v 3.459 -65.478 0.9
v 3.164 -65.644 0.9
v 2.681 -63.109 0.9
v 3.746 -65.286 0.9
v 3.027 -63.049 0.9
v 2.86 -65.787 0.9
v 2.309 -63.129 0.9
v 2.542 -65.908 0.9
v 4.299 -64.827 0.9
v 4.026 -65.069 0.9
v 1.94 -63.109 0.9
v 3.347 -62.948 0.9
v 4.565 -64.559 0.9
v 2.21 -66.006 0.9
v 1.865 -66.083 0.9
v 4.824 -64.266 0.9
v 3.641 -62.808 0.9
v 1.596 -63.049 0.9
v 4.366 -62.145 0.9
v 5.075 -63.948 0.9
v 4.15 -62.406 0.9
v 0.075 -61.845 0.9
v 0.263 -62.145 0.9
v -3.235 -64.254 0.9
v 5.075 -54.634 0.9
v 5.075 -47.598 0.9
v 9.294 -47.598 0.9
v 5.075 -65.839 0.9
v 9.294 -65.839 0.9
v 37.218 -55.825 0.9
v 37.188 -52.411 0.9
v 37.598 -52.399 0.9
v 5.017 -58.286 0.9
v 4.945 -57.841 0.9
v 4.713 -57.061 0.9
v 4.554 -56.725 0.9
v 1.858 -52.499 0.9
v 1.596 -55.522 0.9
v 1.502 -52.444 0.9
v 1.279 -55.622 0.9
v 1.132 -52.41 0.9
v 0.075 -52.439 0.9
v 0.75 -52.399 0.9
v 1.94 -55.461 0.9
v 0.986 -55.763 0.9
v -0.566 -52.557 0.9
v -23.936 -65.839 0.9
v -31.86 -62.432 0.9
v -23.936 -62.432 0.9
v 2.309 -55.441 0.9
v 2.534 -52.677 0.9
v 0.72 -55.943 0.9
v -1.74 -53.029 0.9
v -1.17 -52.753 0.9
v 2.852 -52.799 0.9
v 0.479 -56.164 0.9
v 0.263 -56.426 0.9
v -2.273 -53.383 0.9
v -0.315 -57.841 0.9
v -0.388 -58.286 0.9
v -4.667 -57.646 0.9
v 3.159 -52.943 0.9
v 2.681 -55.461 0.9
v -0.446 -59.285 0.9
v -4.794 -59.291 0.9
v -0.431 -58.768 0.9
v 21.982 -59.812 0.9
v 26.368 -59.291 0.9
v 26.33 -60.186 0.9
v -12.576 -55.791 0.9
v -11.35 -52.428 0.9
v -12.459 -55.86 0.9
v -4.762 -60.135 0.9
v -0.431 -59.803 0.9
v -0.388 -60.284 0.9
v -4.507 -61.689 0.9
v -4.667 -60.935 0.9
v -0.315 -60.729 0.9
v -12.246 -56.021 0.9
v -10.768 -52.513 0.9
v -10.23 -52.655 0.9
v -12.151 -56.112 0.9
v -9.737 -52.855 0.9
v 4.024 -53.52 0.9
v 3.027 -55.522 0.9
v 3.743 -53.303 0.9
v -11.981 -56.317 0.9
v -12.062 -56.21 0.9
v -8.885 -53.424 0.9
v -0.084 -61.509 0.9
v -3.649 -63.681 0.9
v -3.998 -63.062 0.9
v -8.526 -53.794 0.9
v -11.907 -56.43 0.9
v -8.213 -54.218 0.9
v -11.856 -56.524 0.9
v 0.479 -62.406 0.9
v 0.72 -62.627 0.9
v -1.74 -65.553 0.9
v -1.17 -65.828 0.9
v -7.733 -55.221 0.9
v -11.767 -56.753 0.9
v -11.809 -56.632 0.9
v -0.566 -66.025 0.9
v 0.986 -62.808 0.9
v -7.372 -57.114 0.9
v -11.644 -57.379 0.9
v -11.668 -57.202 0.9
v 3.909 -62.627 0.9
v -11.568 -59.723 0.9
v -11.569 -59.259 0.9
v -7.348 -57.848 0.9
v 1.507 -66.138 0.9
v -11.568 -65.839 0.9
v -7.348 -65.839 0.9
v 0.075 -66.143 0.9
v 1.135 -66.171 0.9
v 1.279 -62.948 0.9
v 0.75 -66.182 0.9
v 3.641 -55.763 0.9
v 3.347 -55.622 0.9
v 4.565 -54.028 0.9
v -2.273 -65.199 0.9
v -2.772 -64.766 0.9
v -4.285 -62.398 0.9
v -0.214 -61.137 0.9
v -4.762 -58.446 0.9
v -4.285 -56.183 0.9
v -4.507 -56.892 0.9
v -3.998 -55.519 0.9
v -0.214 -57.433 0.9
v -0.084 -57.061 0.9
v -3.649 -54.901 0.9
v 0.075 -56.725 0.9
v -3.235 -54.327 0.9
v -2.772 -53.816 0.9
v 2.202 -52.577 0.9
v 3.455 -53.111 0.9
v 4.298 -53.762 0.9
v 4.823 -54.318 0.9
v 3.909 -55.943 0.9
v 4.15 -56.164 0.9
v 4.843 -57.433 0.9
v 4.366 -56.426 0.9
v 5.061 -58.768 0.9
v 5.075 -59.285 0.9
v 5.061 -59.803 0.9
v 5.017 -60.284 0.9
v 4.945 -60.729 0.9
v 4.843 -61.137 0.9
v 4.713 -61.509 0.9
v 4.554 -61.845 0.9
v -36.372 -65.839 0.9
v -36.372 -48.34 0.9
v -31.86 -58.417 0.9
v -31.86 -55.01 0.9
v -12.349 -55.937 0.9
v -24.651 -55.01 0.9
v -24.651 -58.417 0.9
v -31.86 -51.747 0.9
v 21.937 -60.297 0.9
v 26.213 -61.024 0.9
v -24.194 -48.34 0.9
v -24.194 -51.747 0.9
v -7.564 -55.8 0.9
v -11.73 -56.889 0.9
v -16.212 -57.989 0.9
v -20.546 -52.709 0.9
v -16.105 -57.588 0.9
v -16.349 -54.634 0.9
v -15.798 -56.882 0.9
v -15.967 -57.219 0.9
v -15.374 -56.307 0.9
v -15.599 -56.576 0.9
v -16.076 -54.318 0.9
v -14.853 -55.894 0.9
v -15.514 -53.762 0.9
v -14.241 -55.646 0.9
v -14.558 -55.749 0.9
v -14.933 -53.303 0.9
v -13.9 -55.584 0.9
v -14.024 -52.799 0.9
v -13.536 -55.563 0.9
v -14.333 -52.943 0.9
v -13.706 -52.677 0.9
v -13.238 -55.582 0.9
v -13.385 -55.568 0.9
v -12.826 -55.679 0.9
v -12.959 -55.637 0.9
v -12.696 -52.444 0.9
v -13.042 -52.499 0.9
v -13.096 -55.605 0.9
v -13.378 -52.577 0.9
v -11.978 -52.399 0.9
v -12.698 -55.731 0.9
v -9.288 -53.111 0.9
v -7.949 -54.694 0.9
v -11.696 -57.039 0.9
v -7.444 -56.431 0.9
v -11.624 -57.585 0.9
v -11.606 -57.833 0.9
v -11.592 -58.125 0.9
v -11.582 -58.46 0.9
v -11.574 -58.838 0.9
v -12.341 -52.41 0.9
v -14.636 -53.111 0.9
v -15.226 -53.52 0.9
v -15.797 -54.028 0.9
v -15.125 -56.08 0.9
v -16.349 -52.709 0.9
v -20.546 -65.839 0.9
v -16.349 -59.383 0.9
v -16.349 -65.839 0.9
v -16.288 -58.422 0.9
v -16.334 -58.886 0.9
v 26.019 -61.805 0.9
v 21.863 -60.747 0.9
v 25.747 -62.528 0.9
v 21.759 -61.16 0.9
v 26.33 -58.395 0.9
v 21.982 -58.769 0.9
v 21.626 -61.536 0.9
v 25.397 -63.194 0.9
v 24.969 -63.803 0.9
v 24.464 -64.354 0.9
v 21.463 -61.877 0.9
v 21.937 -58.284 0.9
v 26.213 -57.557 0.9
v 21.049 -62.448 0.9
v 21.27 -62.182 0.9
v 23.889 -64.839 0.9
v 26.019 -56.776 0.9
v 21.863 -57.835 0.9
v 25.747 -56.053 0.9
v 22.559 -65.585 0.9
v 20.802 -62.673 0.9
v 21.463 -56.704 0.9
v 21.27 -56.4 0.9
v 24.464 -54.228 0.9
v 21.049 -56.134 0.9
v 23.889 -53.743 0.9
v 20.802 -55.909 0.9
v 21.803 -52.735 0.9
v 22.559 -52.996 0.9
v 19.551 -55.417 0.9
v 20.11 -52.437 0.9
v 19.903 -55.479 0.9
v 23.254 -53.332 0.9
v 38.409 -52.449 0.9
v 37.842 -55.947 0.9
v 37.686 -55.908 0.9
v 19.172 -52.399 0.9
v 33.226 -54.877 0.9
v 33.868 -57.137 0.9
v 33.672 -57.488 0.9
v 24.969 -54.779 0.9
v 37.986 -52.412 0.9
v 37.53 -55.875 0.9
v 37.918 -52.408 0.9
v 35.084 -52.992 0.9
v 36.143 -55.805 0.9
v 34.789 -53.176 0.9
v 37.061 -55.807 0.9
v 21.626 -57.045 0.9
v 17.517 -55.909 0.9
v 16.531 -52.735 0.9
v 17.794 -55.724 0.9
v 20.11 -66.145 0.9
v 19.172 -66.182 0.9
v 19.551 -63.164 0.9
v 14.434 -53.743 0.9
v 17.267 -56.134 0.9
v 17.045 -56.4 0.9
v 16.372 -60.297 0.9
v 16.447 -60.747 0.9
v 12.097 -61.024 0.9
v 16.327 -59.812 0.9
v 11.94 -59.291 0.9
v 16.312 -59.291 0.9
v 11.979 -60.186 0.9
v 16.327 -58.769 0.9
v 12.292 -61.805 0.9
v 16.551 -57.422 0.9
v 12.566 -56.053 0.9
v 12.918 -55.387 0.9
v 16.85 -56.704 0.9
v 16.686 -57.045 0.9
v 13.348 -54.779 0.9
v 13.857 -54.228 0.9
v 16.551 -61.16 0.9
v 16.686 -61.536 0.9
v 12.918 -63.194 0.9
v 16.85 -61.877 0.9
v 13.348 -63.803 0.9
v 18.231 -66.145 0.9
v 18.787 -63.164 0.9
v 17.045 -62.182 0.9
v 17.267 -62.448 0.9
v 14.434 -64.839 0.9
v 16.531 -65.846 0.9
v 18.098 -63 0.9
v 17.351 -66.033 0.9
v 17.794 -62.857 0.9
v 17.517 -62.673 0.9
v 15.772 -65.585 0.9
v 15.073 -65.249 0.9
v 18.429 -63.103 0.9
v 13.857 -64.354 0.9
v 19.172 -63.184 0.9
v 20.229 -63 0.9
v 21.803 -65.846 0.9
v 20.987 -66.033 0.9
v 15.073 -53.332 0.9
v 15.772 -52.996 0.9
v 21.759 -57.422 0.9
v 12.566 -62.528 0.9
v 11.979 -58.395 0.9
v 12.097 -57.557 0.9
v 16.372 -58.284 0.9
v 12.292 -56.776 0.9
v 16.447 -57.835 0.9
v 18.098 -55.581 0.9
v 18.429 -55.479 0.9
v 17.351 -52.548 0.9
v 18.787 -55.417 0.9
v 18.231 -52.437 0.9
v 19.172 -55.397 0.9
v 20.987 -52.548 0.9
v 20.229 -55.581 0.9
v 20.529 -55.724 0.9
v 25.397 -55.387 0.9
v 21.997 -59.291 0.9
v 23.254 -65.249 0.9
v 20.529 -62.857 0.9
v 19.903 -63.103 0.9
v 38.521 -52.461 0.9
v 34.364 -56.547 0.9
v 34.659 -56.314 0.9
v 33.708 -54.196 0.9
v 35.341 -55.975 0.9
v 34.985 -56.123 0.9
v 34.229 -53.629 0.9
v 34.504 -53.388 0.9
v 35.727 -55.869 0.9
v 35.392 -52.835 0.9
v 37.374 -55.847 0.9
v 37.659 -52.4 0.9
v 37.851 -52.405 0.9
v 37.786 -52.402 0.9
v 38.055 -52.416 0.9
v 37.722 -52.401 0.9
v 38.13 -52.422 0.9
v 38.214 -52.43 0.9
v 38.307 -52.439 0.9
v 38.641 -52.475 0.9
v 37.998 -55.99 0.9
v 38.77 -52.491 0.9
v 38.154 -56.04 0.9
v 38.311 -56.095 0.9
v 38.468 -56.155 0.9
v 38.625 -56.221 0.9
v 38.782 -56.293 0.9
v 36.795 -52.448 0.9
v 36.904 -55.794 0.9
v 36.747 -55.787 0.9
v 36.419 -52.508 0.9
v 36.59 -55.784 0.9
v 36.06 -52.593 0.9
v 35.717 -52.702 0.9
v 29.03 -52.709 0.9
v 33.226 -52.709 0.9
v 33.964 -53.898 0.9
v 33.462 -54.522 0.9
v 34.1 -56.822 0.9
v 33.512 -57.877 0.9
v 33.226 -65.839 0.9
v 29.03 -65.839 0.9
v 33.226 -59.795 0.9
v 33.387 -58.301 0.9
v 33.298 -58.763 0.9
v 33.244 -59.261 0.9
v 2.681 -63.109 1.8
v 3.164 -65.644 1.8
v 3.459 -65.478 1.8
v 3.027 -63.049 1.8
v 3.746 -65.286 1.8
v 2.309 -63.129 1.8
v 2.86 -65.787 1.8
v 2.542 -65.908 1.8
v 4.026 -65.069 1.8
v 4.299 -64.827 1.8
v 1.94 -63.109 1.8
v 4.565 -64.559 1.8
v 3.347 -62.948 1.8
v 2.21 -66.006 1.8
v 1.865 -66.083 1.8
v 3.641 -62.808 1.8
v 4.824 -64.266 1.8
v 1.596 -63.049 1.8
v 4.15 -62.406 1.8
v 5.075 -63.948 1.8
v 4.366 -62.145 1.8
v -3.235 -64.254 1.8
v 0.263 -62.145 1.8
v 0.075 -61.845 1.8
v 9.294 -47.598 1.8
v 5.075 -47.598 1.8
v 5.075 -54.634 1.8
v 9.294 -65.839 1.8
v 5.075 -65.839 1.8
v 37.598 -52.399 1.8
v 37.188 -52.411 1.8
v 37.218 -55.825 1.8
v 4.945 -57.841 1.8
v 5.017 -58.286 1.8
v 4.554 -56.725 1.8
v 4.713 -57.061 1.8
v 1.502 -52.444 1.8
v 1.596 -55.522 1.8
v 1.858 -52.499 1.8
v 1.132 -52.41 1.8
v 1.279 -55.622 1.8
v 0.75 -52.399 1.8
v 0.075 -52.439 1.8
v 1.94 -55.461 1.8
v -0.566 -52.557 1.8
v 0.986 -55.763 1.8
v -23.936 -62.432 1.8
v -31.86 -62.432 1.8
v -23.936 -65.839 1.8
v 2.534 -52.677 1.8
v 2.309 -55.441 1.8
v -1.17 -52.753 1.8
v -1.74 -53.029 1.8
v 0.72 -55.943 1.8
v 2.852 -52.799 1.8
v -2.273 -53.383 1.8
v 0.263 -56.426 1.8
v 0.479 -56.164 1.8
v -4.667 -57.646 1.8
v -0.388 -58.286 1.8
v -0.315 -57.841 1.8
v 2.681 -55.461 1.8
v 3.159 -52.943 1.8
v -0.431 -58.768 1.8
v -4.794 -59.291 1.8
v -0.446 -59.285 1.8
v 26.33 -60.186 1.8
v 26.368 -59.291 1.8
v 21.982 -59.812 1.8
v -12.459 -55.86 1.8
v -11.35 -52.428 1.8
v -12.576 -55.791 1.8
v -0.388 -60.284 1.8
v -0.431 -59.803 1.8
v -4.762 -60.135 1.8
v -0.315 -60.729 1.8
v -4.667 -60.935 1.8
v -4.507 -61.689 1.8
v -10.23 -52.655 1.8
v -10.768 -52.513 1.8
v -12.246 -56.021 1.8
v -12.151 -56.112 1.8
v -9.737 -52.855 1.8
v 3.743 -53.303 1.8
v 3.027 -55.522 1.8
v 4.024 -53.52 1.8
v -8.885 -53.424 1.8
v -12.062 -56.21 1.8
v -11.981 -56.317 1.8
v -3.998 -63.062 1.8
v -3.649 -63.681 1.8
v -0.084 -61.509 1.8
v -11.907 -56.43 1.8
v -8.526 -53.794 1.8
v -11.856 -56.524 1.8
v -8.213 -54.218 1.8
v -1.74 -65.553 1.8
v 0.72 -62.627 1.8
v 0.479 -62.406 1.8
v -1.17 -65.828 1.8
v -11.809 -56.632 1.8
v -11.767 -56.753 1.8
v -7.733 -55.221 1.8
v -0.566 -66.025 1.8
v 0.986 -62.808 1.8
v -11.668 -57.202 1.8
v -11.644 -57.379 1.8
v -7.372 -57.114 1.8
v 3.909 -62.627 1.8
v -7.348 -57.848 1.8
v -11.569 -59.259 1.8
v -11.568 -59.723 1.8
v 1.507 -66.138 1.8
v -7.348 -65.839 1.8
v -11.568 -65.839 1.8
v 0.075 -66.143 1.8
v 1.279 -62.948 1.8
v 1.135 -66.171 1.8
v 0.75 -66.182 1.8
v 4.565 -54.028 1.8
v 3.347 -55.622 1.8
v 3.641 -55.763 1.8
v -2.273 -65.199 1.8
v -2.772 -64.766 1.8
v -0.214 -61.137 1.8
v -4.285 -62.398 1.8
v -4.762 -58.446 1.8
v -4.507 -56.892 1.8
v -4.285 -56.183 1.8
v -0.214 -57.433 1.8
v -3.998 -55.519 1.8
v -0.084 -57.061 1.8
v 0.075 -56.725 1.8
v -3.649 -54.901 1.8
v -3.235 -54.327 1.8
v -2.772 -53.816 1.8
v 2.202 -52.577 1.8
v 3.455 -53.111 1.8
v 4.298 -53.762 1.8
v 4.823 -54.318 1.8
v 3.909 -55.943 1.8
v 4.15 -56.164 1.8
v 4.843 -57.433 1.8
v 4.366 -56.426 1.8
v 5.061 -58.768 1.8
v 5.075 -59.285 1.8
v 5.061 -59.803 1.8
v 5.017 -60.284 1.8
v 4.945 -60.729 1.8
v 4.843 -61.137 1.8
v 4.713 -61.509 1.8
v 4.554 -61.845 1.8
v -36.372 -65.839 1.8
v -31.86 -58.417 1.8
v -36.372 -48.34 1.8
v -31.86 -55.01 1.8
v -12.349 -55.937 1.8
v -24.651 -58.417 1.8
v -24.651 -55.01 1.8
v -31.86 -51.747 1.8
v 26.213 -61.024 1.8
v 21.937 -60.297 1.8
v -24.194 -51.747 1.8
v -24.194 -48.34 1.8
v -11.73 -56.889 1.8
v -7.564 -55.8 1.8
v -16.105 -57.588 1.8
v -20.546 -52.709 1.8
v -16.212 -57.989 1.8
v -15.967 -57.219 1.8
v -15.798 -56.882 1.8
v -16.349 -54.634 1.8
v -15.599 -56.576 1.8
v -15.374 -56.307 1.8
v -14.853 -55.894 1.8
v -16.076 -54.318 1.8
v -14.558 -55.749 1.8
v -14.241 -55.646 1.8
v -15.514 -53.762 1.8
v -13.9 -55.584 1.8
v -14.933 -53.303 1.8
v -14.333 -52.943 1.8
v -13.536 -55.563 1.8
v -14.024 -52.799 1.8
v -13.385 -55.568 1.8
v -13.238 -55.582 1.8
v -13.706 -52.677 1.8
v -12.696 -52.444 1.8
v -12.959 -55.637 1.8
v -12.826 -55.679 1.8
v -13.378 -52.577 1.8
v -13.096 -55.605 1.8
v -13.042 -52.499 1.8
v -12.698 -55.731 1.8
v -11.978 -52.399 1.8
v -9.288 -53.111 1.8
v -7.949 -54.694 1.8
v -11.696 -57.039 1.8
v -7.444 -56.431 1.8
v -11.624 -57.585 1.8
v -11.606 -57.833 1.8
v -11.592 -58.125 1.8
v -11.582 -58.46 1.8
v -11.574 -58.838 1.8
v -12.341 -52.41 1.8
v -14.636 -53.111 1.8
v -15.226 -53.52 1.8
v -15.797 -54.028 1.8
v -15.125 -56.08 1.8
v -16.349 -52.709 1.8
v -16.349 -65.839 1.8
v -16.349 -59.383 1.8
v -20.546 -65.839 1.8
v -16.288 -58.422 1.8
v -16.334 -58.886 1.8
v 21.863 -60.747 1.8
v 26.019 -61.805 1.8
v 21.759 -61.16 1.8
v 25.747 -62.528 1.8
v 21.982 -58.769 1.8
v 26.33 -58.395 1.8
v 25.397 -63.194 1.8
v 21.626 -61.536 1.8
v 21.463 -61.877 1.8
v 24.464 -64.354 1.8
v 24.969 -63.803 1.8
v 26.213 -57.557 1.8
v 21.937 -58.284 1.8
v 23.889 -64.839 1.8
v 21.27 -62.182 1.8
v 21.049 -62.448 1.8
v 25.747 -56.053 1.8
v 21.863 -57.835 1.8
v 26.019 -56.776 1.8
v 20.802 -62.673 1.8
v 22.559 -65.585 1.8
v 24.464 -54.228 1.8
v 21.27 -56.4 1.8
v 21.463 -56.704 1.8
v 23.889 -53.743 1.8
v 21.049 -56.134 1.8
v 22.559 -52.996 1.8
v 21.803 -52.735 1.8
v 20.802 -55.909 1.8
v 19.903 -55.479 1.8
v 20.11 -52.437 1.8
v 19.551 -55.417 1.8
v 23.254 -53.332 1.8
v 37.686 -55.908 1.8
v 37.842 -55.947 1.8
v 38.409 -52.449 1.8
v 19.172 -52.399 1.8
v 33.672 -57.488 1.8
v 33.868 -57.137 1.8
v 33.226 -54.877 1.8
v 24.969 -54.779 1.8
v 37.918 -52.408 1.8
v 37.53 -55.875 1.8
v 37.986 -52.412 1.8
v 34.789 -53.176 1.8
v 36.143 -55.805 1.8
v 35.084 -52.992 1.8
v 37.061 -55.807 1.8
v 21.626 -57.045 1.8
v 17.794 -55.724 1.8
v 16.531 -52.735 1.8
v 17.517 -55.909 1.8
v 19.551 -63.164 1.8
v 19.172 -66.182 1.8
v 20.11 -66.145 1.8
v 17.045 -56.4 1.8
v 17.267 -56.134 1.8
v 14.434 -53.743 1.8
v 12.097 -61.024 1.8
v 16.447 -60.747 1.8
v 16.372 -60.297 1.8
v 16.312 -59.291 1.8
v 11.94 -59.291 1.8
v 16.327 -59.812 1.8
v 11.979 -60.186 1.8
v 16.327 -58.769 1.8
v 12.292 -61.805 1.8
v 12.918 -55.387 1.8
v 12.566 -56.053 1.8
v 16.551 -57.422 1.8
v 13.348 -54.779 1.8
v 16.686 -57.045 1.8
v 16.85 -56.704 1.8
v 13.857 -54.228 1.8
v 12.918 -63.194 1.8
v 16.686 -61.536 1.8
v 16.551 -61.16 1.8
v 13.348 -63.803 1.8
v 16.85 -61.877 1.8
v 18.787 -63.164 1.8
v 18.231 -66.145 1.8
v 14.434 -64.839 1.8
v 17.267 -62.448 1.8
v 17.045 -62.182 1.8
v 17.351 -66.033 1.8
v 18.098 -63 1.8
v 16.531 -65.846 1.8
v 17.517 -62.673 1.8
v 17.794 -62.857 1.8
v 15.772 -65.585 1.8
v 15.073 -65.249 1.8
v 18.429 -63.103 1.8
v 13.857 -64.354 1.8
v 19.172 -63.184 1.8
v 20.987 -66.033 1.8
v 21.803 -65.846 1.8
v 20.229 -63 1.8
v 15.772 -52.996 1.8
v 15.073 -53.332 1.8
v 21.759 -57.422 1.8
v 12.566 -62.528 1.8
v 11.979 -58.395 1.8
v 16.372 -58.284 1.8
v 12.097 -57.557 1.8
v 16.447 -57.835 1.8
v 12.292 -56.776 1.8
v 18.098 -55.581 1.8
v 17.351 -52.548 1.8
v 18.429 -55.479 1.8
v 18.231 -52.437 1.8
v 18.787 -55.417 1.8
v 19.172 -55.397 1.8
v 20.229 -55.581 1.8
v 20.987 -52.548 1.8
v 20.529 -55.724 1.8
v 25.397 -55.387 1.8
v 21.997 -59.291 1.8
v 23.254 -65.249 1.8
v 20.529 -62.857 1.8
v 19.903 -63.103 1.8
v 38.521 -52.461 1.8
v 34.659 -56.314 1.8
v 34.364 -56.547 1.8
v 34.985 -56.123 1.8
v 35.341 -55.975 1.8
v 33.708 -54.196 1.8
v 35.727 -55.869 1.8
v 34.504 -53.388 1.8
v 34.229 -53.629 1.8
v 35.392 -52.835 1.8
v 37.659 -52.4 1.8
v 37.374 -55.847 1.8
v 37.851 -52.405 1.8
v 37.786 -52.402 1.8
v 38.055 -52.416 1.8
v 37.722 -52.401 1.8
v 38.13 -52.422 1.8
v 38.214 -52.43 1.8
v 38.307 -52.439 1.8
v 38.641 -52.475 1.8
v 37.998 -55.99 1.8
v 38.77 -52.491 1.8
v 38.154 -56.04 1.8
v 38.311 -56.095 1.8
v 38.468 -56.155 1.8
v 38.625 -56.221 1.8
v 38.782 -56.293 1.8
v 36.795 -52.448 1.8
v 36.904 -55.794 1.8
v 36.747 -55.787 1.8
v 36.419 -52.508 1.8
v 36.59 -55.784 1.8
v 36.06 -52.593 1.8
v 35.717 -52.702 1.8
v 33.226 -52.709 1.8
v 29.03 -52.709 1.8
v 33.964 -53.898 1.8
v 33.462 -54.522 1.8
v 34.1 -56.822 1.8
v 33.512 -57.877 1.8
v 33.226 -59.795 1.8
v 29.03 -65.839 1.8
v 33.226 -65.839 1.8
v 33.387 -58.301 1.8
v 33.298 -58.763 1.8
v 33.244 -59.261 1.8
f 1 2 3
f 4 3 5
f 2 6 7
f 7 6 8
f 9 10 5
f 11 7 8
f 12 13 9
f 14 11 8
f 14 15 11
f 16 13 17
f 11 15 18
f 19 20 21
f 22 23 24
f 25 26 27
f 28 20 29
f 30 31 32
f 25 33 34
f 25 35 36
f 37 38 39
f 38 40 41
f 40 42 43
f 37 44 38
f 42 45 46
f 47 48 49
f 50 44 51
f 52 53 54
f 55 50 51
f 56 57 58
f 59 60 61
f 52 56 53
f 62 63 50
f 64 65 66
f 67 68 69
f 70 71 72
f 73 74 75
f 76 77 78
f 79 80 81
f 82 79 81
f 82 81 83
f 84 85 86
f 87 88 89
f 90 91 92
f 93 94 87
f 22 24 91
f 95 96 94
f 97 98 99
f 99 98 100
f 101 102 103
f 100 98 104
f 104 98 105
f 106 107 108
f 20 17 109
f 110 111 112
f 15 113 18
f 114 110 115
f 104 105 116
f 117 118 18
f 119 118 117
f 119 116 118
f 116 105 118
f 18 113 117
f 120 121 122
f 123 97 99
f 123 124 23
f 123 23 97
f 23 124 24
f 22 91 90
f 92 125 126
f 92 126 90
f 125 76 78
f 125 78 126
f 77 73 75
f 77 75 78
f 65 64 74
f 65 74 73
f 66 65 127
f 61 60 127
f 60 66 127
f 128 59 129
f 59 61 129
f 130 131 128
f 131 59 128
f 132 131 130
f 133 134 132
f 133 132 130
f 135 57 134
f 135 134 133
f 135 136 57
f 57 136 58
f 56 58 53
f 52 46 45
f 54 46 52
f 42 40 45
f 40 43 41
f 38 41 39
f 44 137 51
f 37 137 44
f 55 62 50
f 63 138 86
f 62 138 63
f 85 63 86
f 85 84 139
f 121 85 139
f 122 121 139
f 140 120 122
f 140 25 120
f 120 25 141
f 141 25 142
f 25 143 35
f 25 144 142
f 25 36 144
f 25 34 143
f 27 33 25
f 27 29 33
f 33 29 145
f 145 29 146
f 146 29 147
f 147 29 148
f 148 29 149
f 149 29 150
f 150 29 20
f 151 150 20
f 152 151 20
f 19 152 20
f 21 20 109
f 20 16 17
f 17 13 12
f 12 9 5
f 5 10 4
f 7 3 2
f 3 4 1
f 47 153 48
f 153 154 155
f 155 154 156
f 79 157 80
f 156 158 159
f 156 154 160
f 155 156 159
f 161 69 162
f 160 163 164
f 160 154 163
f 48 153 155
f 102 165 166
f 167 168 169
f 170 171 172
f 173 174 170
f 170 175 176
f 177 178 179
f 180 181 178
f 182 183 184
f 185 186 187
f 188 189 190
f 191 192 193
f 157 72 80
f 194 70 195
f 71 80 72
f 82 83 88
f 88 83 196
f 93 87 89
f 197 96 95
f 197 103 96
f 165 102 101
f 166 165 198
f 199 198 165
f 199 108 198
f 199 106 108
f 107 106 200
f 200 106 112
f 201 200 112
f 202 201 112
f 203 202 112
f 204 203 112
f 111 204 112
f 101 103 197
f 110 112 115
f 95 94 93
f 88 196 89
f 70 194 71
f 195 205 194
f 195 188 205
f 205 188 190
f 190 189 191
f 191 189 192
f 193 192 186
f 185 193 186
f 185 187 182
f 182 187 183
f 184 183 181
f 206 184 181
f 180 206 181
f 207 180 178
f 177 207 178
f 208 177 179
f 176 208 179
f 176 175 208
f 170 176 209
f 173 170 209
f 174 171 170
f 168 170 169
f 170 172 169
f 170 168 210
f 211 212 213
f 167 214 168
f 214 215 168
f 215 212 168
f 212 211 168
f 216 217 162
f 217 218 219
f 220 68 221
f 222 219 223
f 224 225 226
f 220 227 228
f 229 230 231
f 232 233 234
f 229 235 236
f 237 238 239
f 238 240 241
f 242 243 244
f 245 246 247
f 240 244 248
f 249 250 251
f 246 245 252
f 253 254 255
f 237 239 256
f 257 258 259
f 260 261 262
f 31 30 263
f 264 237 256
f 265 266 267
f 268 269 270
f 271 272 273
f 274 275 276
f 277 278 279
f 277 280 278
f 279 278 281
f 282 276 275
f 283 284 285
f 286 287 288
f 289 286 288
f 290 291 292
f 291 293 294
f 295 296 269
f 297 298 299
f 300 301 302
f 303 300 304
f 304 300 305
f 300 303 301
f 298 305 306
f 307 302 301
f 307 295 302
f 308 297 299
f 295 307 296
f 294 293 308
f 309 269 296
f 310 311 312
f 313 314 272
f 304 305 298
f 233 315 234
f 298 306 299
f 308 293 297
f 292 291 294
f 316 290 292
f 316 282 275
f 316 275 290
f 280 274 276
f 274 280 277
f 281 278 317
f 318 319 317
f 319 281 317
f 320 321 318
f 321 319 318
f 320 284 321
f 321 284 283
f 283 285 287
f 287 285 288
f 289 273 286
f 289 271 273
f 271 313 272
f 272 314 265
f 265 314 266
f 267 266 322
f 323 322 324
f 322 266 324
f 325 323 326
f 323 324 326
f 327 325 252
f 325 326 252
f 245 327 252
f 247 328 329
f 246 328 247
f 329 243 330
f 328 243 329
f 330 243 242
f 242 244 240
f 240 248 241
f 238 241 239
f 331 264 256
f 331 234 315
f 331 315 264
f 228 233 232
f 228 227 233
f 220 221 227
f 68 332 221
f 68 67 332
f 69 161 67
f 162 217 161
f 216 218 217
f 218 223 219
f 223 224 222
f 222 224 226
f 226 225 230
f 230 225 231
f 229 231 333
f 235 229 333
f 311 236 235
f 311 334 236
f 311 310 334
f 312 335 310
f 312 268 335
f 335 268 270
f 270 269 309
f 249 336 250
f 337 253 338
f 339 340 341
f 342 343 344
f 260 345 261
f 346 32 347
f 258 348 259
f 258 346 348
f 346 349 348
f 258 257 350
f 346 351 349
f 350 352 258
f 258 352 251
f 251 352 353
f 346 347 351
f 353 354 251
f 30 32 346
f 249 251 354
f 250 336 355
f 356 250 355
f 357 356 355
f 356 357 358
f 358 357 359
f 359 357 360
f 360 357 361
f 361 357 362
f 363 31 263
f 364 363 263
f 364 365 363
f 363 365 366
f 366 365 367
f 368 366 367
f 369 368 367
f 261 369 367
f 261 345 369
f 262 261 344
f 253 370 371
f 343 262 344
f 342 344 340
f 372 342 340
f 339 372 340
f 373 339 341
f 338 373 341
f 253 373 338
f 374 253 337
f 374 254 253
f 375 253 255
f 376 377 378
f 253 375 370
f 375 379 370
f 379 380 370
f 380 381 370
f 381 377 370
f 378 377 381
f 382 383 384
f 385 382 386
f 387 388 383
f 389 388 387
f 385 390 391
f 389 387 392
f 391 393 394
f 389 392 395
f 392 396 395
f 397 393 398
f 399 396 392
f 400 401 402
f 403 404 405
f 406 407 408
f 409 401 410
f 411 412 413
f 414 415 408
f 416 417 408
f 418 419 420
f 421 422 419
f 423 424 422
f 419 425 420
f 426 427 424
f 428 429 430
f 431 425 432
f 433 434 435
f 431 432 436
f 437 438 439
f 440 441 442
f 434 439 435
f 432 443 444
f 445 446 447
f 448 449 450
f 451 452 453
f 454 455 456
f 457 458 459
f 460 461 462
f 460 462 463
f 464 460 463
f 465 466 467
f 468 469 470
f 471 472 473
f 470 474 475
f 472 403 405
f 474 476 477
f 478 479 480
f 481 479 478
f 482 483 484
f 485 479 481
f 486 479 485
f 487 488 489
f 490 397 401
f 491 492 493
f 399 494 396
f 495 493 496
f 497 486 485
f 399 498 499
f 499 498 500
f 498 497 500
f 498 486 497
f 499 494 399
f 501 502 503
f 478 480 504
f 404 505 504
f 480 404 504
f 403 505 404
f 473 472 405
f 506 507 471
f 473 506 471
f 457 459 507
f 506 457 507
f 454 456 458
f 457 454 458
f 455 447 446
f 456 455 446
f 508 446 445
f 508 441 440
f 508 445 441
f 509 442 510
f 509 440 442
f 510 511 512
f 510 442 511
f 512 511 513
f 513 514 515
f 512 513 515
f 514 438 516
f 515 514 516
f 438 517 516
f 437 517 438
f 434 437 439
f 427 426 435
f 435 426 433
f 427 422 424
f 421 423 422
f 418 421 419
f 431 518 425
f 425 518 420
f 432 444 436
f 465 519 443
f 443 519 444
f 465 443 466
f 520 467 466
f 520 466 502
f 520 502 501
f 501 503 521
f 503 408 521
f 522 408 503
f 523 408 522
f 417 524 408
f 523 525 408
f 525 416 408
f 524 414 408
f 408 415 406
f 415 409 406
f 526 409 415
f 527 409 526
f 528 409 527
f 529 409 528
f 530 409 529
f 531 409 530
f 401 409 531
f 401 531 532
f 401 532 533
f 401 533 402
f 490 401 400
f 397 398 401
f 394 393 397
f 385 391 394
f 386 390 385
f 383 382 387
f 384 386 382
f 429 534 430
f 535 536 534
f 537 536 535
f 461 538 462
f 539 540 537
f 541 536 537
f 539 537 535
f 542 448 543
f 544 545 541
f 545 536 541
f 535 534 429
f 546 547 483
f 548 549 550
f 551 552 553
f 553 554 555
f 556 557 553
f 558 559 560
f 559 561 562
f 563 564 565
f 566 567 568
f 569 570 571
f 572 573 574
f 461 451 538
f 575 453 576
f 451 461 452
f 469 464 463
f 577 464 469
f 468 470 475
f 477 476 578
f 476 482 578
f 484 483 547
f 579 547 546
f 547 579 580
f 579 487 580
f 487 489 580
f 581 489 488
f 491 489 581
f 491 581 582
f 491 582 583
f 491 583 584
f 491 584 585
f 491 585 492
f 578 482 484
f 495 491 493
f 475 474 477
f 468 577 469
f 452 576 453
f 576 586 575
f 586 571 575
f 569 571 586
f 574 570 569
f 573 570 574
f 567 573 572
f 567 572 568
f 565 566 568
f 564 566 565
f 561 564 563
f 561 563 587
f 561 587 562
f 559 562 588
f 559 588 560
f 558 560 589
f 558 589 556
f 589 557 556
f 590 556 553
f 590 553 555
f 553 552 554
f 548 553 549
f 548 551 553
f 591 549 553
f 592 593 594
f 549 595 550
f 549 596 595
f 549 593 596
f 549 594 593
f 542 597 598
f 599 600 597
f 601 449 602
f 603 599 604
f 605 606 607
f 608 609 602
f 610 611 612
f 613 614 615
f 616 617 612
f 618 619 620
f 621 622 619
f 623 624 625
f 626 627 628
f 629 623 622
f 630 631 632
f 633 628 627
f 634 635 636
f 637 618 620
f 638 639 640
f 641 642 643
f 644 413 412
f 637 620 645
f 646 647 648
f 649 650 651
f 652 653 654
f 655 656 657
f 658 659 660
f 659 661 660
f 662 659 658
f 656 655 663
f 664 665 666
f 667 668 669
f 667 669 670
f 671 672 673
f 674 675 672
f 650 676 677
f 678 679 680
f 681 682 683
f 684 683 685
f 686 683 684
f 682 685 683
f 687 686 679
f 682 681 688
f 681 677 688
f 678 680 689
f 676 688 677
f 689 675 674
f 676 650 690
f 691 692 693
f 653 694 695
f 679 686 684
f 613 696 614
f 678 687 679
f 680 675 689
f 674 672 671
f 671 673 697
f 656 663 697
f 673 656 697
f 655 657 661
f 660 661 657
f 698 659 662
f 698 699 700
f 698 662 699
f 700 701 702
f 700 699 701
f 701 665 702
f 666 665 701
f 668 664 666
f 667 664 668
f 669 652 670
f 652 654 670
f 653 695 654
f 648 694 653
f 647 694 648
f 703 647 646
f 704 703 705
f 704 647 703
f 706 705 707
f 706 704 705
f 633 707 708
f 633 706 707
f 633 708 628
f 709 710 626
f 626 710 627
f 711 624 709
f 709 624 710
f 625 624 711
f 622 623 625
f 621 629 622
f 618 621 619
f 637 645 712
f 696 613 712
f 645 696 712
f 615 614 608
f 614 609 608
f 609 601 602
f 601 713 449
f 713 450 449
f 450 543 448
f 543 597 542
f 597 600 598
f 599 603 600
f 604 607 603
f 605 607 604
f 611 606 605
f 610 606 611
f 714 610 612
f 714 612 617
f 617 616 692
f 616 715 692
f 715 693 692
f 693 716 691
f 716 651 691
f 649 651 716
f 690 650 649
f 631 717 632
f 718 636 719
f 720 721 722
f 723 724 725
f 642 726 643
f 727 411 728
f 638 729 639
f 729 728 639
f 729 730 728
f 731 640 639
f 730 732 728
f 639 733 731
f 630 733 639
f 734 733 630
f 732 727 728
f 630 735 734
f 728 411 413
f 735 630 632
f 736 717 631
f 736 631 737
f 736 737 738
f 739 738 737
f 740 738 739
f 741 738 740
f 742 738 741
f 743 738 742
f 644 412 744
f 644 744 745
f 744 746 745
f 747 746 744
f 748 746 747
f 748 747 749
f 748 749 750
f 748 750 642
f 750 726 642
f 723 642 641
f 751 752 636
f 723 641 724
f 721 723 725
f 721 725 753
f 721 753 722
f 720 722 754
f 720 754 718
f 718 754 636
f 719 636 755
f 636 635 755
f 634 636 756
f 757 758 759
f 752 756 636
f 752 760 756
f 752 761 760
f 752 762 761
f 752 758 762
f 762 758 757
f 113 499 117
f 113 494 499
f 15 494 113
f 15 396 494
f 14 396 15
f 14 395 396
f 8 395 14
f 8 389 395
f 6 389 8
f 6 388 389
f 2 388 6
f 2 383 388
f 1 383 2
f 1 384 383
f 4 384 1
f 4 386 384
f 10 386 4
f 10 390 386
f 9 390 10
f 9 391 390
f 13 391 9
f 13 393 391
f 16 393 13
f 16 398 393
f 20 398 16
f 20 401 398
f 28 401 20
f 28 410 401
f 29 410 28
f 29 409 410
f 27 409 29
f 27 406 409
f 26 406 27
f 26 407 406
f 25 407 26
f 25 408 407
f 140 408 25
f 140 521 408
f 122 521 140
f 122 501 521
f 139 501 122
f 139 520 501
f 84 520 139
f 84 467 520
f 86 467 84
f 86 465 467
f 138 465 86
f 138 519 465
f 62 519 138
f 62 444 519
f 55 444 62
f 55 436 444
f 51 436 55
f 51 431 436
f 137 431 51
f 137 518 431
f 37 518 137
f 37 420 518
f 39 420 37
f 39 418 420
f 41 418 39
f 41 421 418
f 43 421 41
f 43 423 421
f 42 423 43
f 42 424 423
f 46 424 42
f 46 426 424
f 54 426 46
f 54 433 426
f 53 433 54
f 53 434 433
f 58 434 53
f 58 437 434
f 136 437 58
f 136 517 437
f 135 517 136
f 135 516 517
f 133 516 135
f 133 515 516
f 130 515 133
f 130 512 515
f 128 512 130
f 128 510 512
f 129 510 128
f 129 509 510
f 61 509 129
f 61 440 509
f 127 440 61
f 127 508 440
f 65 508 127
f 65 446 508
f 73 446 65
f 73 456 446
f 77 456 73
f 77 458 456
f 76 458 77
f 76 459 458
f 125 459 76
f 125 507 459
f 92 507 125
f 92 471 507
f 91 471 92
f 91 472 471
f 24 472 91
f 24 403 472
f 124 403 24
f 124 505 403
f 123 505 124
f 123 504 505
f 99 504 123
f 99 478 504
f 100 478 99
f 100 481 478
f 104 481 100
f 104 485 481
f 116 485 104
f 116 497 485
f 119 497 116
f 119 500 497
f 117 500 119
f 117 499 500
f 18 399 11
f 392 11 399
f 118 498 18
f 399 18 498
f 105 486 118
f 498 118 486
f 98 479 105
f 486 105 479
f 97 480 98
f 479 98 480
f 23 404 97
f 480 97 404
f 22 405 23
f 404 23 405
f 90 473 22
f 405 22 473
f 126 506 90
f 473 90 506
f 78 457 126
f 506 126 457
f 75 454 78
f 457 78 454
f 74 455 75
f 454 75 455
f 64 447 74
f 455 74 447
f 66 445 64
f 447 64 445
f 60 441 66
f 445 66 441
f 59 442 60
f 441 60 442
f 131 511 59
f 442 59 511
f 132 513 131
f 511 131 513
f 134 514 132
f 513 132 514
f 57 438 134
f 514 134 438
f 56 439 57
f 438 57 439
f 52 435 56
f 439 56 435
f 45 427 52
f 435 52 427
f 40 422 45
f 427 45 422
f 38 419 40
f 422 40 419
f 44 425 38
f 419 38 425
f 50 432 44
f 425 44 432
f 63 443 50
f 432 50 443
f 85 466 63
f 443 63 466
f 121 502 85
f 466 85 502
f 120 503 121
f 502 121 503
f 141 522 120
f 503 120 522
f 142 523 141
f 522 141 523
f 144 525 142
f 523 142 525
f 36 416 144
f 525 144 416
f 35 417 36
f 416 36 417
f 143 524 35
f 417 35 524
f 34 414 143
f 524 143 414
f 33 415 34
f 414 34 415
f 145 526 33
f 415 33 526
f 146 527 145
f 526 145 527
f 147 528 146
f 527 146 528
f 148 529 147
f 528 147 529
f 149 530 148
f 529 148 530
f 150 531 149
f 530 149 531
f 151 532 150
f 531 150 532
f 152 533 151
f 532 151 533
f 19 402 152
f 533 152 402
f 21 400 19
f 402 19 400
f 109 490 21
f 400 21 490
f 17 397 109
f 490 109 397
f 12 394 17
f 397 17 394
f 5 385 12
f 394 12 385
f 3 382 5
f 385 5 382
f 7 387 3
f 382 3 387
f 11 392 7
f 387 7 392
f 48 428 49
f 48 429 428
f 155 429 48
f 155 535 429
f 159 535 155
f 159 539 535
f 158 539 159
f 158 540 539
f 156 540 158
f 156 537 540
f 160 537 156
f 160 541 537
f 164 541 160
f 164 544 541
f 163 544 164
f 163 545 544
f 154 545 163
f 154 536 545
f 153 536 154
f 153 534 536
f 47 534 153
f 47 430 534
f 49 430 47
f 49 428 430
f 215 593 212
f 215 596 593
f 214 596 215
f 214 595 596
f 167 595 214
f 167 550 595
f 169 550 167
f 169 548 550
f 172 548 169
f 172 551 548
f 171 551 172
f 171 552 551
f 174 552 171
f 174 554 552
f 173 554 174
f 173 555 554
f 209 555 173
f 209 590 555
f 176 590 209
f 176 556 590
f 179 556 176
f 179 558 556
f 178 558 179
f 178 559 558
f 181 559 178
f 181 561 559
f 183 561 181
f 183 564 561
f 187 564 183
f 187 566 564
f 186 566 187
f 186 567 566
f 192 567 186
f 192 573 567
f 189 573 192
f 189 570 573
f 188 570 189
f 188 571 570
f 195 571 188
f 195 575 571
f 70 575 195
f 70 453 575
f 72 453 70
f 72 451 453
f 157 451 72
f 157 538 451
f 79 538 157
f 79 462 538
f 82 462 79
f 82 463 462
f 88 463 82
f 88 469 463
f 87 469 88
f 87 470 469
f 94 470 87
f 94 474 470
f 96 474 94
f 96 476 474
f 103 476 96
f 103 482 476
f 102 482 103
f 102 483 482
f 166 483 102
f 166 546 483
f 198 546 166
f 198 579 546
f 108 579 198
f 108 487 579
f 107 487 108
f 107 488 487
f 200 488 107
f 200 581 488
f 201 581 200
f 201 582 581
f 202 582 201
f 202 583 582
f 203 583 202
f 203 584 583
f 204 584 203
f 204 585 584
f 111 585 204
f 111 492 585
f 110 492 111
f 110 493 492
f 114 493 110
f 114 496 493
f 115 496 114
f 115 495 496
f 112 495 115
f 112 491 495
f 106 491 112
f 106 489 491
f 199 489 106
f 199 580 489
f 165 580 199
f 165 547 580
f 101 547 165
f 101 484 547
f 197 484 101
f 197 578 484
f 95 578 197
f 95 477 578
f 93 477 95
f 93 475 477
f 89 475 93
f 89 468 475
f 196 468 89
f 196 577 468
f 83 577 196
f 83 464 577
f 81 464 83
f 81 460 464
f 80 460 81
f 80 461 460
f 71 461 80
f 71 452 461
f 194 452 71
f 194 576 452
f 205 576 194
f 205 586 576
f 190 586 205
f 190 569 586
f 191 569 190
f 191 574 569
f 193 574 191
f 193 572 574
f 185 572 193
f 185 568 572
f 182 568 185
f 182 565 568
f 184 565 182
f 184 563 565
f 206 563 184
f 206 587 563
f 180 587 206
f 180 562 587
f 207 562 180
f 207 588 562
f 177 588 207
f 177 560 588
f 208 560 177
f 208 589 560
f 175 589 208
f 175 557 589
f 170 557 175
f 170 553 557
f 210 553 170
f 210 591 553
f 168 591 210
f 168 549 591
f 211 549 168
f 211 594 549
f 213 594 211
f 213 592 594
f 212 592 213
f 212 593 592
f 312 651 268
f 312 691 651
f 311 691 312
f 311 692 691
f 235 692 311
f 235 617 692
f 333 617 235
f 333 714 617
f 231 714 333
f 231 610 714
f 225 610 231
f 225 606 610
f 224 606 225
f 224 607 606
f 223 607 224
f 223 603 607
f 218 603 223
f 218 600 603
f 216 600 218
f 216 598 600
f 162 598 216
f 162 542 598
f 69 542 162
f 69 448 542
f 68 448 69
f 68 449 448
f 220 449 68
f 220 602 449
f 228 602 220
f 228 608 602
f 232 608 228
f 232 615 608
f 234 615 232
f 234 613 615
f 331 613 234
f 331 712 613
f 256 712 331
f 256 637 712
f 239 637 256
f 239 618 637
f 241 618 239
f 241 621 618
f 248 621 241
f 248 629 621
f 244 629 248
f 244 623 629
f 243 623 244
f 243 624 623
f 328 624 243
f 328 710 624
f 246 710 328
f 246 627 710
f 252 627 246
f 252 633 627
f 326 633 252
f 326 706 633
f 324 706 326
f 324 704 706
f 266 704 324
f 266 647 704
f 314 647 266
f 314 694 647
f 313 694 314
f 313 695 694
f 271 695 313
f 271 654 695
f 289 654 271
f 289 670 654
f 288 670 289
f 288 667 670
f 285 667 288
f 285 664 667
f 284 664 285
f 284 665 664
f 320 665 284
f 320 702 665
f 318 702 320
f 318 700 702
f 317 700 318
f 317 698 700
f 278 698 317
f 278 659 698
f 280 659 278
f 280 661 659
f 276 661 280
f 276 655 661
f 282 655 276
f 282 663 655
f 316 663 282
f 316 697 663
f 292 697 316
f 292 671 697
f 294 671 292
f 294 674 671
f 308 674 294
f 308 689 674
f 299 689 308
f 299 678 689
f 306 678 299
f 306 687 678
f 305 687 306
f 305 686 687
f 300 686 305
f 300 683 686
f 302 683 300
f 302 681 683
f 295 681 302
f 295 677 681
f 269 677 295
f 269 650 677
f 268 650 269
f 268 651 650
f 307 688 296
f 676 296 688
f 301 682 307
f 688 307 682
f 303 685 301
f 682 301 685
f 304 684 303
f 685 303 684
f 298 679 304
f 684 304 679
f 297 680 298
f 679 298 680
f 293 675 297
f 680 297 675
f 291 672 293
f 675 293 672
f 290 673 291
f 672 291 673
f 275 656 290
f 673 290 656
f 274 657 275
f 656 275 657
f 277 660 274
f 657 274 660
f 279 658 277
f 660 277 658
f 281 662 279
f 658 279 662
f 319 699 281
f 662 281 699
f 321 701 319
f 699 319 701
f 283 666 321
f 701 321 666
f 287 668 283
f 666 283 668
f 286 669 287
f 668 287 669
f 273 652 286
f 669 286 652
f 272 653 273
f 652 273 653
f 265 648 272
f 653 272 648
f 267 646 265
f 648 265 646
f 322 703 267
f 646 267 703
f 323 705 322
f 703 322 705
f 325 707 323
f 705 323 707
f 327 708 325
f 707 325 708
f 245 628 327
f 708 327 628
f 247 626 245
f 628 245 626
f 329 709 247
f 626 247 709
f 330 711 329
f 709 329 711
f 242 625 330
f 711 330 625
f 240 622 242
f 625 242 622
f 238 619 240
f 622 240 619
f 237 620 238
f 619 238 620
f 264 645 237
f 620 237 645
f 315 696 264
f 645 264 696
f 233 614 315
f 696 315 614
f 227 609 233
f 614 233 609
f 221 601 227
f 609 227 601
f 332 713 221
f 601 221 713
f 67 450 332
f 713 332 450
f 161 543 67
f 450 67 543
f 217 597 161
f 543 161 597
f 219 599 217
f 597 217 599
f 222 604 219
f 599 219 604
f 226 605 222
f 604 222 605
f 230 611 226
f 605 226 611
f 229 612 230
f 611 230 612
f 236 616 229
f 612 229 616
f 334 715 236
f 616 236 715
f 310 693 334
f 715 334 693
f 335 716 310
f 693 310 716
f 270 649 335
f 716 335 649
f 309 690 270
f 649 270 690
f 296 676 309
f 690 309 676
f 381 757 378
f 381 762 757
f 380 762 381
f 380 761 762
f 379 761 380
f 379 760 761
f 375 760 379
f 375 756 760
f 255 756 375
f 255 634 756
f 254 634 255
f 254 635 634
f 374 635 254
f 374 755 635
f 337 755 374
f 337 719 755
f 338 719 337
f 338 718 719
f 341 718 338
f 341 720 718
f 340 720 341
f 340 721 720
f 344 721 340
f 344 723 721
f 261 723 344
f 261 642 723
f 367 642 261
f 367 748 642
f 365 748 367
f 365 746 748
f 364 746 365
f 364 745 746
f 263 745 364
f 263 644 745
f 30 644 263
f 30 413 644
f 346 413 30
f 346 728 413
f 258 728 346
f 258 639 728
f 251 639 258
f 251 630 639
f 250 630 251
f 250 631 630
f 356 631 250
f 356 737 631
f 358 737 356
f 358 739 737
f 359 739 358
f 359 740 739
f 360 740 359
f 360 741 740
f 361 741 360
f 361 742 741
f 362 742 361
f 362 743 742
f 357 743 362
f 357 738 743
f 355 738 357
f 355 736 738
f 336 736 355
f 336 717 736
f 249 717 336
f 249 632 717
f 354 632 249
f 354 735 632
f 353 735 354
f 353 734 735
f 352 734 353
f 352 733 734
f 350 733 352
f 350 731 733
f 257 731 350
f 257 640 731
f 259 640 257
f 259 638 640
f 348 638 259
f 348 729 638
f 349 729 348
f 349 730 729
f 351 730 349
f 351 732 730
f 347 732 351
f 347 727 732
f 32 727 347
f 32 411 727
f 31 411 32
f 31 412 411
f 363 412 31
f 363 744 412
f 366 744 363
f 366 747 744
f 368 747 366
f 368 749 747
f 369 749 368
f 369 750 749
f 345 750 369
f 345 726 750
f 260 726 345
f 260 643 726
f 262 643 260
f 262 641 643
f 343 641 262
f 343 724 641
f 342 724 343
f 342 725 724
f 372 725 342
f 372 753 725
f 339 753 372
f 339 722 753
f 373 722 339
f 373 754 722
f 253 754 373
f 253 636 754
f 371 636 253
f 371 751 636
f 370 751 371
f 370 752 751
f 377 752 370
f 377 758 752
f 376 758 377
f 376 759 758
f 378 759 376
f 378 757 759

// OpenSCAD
$fn = 48;
  // English (below bottom hole)
  translate([0, -57.100, 0.900]) linear_extrude(height=0.900) text("Endor", size=17.284, halign="center", valign="center", font="Helvetica Neue:style=Bold");
